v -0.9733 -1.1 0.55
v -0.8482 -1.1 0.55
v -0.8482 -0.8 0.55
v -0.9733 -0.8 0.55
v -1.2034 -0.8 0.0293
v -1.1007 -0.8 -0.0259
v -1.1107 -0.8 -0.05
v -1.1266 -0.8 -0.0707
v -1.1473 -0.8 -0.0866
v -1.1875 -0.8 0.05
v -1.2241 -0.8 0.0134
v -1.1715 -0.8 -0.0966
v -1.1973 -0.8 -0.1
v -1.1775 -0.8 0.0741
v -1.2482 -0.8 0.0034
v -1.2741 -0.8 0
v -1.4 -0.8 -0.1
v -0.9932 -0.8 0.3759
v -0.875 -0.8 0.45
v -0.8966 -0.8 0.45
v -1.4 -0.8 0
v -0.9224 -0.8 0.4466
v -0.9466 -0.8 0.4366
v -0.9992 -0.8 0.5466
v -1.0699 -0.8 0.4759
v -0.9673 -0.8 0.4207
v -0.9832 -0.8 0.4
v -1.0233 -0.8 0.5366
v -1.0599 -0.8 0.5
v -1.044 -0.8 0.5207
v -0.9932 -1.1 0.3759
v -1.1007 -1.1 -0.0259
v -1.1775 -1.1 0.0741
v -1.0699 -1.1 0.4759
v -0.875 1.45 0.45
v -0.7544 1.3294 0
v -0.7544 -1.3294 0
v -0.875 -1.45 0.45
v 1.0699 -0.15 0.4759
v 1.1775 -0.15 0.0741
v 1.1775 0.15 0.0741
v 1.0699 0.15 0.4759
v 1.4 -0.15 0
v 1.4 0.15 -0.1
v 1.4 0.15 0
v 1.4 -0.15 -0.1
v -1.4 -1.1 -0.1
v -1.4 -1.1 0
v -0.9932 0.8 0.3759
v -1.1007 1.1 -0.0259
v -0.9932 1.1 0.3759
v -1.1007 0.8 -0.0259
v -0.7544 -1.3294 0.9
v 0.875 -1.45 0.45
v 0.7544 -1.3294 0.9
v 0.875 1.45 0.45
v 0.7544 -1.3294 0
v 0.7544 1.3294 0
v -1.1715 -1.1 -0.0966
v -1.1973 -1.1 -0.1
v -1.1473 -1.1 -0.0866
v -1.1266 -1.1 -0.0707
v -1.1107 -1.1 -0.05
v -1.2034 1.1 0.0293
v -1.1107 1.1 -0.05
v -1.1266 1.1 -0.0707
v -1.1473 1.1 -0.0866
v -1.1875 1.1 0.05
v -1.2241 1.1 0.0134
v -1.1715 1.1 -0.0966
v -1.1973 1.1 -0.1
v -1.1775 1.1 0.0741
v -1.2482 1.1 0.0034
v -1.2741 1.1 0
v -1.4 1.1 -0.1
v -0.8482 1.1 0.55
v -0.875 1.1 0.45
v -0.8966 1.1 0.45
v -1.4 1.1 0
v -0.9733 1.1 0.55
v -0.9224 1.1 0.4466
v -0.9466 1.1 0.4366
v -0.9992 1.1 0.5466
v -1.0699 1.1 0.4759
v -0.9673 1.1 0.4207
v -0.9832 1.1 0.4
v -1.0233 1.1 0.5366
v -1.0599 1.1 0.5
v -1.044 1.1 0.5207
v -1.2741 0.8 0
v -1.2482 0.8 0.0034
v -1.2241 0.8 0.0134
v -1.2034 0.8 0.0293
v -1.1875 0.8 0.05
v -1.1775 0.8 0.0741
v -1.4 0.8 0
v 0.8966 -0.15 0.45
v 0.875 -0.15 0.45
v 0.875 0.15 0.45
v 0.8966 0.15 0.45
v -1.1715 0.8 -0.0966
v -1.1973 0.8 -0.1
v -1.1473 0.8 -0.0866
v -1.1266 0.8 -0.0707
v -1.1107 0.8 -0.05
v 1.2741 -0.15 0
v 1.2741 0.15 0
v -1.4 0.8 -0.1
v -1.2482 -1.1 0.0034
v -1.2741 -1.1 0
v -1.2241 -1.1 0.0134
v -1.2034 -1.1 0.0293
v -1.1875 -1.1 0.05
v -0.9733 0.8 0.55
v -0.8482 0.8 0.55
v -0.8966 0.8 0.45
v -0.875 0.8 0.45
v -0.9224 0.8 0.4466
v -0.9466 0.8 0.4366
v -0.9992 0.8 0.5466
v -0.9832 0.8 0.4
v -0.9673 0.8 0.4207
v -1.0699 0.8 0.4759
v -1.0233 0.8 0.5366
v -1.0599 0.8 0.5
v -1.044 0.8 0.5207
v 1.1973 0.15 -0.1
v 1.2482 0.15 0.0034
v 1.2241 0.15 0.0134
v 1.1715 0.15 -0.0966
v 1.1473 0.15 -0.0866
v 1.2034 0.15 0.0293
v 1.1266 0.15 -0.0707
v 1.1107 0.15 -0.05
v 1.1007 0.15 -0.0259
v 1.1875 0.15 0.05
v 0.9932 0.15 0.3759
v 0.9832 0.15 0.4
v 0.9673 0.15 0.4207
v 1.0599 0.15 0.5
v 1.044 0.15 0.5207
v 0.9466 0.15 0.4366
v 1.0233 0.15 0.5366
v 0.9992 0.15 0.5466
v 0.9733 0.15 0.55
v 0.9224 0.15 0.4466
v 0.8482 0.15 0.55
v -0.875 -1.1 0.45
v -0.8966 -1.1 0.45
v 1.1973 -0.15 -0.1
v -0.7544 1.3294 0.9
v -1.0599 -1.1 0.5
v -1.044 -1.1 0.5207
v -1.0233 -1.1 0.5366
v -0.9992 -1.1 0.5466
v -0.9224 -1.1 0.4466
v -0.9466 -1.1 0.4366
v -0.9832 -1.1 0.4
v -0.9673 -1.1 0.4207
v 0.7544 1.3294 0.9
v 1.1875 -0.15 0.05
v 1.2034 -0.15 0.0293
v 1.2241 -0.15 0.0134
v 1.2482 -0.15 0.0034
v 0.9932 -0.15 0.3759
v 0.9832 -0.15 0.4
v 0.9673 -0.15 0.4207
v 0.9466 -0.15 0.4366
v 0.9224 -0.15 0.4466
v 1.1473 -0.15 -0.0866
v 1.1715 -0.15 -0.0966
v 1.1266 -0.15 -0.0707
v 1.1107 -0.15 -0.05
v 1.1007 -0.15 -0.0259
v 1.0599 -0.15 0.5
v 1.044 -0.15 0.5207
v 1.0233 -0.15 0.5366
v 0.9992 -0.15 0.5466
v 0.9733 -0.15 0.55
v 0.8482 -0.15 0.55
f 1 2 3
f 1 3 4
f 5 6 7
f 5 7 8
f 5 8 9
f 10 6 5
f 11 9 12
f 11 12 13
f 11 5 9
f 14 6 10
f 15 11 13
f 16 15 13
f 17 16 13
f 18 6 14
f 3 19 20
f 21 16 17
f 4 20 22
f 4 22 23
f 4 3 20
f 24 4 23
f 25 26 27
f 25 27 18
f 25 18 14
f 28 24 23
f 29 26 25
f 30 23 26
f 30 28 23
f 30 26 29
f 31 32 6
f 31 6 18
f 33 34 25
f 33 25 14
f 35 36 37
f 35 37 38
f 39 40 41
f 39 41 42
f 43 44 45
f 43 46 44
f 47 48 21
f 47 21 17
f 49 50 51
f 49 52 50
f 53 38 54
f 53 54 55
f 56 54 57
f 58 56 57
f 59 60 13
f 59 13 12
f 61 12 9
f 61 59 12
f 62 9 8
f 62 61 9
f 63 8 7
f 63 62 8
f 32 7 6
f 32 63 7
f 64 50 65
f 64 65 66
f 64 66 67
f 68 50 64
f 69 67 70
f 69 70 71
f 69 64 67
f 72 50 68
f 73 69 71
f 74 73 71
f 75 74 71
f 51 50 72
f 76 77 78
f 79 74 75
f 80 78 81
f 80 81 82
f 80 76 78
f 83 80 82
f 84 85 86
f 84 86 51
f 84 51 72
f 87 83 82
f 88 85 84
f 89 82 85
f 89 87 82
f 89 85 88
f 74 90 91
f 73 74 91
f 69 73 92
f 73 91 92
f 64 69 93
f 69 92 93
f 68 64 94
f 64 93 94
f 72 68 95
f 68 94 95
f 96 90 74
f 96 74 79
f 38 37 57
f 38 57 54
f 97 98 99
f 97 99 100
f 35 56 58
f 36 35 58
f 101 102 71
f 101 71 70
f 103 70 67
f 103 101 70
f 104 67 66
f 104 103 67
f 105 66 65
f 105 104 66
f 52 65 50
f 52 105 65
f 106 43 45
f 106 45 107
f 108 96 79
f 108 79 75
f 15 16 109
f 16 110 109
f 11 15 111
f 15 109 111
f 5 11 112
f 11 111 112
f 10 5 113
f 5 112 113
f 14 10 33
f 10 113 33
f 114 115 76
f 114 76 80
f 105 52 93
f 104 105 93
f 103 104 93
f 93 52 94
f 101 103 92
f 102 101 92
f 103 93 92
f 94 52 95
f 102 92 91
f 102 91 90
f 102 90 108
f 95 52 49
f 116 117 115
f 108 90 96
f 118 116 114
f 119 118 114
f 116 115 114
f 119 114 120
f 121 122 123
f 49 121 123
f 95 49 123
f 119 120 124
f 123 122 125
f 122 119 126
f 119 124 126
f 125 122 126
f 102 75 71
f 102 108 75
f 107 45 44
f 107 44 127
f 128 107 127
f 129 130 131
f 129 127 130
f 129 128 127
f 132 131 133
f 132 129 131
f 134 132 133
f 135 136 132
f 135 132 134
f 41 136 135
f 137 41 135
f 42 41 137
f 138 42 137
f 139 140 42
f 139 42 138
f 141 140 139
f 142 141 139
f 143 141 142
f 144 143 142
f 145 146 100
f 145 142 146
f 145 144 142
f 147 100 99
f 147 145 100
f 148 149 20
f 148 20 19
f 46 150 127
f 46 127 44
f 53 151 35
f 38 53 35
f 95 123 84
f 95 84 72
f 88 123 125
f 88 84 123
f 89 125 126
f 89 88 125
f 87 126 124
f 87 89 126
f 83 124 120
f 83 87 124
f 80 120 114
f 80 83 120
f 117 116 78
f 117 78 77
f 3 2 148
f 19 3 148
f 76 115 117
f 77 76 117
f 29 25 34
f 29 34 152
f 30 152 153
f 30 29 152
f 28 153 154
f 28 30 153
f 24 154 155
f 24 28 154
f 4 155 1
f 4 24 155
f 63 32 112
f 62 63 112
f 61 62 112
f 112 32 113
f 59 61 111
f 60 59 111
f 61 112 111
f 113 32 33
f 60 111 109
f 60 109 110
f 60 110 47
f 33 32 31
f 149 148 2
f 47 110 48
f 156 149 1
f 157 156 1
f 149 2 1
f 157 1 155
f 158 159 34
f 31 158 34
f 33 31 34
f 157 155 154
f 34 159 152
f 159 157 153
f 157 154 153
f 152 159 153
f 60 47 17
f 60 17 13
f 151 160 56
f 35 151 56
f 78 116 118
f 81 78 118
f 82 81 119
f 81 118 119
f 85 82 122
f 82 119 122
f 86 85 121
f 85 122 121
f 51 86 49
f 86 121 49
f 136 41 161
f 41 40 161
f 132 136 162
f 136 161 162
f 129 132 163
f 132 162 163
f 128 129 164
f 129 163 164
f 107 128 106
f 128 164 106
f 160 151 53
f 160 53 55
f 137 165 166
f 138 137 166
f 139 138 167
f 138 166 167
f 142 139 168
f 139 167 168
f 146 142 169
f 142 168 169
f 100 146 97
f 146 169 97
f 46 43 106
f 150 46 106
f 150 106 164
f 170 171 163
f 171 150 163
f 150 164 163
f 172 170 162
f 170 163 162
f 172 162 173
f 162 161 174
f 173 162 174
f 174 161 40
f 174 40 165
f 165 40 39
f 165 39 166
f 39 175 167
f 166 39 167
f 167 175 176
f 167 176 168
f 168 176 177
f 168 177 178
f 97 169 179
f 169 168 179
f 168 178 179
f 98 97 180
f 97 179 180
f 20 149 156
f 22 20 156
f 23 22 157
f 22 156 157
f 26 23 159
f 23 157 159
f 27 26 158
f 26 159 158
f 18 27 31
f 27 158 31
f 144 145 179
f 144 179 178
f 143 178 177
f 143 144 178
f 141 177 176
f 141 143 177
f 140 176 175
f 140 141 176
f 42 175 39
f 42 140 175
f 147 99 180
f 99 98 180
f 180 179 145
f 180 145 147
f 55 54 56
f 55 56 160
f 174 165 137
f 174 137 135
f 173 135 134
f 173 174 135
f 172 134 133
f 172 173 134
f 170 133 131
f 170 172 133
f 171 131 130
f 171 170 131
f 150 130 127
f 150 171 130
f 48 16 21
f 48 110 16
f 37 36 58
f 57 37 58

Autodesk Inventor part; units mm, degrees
ref_plane "XZ Plane" through (0, 0, 0) normal (0, 1, 0) x (-1, 0, 0)
ref_plane "XY Plane" through (0, 0, 0) normal (0, 0, 1) x (1, 0, 0)
sketch "Sketch1" plane through (0, 0, 0) normal (0, 0, 1) x (1, 0, 0)
  line L0 (0.875, -1.45) -> (-0.875, -1.45)
  line L1 (-0.875, -1.45) -> (-0.875, 1.45)
  line L2 (-0.875, 1.45) -> (0.875, 1.45)
  line L3 (0.875, 1.45) -> (0.875, -1.45)
  line L4 (0.875, -1.45) -> (-0.875, 1.45) construction
  line L5 (-0.875, -1.45) -> (0.875, 1.45) construction
  point P0 (0, 0)
  dimension "d0" = 1.75
  dimension "d1" = 2.9
extrude "Extrusion1" add sketch "Sketch1" along normal blind 0.9
sketch "Sketch2" plane through (-0.875, 1.45, 0) normal (0, 1, 0) x (1, 0, 0)
  line L0 (0, 0) -> (1.75, 0) projected
  line L1 (0, 0) -> (0, -0.9) projected
  line L2 (1.75, -0.9) -> (0, -0.9) projected
  line L3 (1.75, 0) -> (1.75, -0.9) projected
  line L4 (1.75, -0.45) -> (1.6294, -0.9)
  line L5 (0, -0.9) -> (1.75, -0.9) projected
  line L6 (1.75, -0.45) -> (1.6294, 0)
  line L7 (1.75, 0) -> (0, 0) projected
  line L8 (0.1206, 0) -> (0, -0.45)
  line L9 (0.1206, -0.9) -> (0, -0.45)
  point P0 (0.875, 0)
  dimension "d4" = 15
  dimension "d5" = 15
extrude "Extrusion2" cut sketch "Sketch2" against normal through all contours L0 L6 L4 L2 L9 L8 keep common part
ref_plane "Work Plane1" through (1.25, 0, 0) normal (1, 0, 0) x (0, 1, 0)
sketch "Sketch4" plane through (1.25, 0, 0) normal (1, 0, 0) x (0, 1, 0)
  line L0 (1.45, 0.9) -> (-1.45, 0.9) projected
  line L1 (-1.45, 0) -> (1.45, 0) projected
  line L2 (-1.3294, 0) -> (-1.45, 0.45)
  line L3 (-1.45, 0.45) -> (-1.3294, 0.9)
  line L4 (1.3294, 0.9) -> (1.45, 0.45)
  line L5 (1.45, 0.45) -> (1.3294, 0)
  line L6 (1.45, 0) -> (1.45, 0.45) projected
  line L7 (-1.45, 0.45) -> (-1.45, 0) projected
  point P0 (0, 0)
  dimension "d10" = 15
  dimension "d11" = 15
  dimension "d12" = 0
extrude "Extrusion3" cut sketch "Sketch4" against normal through all contours L4 L5 L1 L2 L3 L0 keep common part
sketch "Sketch5" plane through (0, 0, 0) normal (0, 1, 0) x (-1, 0, 0)
  line L0 (-0.875, 0.45) -> (-0.7544, 0.9) projected
  line L1 (-0.7544, 0) -> (-0.875, 0.45) projected
  line L2 (-0.875, 0.45) -> (-0.9733, 0.45)
  line L3 (-0.9733, 0.45) -> (-1.1206, -0.1)
  line L4 (-1.1206, -0.1) -> (-1.4, -0.1)
  line L5 (-1.4, -0.1) -> (-1.4, 0)
  line L6 (-1.4, 0) -> (-1.1974, 0)
  line L7 (-1.1974, 0) -> (-1.05, 0.55)
  line L8 (-1.05, 0.55) -> (-0.8482, 0.55)
  line L9 (0.7544, 0) -> (-0.7544, 0) projected
  point P0 (0, 0)
  point P1 (0, 0)
  dimension "d15" = 0.1
  dimension "d17" = 0.1
  dimension "d18" = 0.1
  dimension "d19" = 0.1
  dimension "d20" = 105
  dimension "d21" = 1.4
  dimension "d22" = 0.35
extrude "Extrusion4" add sketch "Sketch5" along normal mid plane 0.3 separate body
fillet "Fillet1" radius 0.1 4 edges at (1.1974, 0, 0) (1.05, 0, 0.55) (1.1206, 0, -0.1) (0.9733, 0, 0.45)
pattern_linear "Rectangular Pattern1" count 3 spacing 0.95 along (0, 1, 0) of "Extrusion4", "Fillet1" first direction both ways yes bodies 2
mirror "Mirror1" about plane through (0, 0, 0) normal (1, 0, 0) of "Extrusion4", "Rectangular Pattern1" bodies 2
sketch "Sketch7" plane through (-1.4, 0.15, -0.1) normal (0, 1, 0) x (1, 0, 0)
  line L0 (0.5518, -0.65) -> (0.525, -0.55) projected
  line L1 (0.35, -0.65) -> (0.5518, -0.65) projected
  line L2 (0.2026, -0.1) -> (0.35, -0.65) projected
  line L3 (0, -0.1) -> (0.2026, -0.1) projected
  line L4 (0, 0) -> (0, -0.1) projected
  line L5 (0.2794, 0) -> (0, 0) projected
  line L6 (0.4267, -0.55) -> (0.2794, 0) projected
  line L7 (0.525, -0.55) -> (0.4267, -0.55) projected
  arc A0 (0.2992, -0.0741) -> (0.2026, 0) centre (0.2026, -0.1) ccw projected
  line L8 (0, 0) -> (0.2026, 0) projected
  line L9 (0, -0.1) -> (0, 0) projected
  line L10 (0.1259, -0.1) -> (0, -0.1) projected
  arc A1 (0.2225, -0.1741) -> (0.1259, -0.1) centre (0.1259, -0.2) ccw projected
  line L11 (0.3301, -0.5759) -> (0.2225, -0.1741) projected
  arc A2 (0.3301, -0.5759) -> (0.4267, -0.65) centre (0.4267, -0.55) ccw projected
  line L12 (0.5518, -0.65) -> (0.4267, -0.65) projected
  line L13 (0.525, -0.55) -> (0.5518, -0.65) projected
  line L14 (0.5035, -0.55) -> (0.525, -0.55) projected
  arc A3 (0.4069, -0.4759) -> (0.5035, -0.55) centre (0.5035, -0.45) ccw projected
  line L15 (0.2992, -0.0741) -> (0.4069, -0.4759) projected
  point P0 (1.4, -0.1)
extrude "Extrusion6" cut sketch "Sketch7" against normal up to surface (0.3 mm away) bodies 2
sketch "Sketch8" plane through (1.1974, -1.1, -0.1) normal (0, -1, 0) x (1, 0, 0)
  arc A0 (-0.0966, 0.0741) -> (0, 0) centre (0, 0.1) ccw projected
  line L0 (0, 0) -> (0.2026, 0) projected
  line L1 (0.2026, 0) -> (0.2026, 0.1) projected
  line L2 (0.2026, 0.1) -> (0.0767, 0.1) projected
  arc A1 (-0.0199, 0.1741) -> (0.0767, 0.1) centre (0.0767, 0.2) ccw projected
  line L3 (-0.0199, 0.1741) -> (-0.1275, 0.5759) projected
  arc A2 (-0.1275, 0.5759) -> (-0.2241, 0.65) centre (-0.2241, 0.55) ccw projected
  line L4 (-0.2241, 0.65) -> (-0.3492, 0.65) projected
  line L5 (-0.3492, 0.65) -> (-0.3224, 0.55) projected
  line L6 (-0.3224, 0.55) -> (-0.3008, 0.55) projected
  arc A3 (-0.2042, 0.4759) -> (-0.3008, 0.55) centre (-0.3008, 0.45) ccw projected
  line L7 (-0.2042, 0.4759) -> (-0.0966, 0.0741) projected
  point P0 (-1.1974, 0.1)
extrude "Extrusion7" cut sketch "Sketch8" against normal up to surface (0.3 mm away) bodies 2
sketch "Sketch9" plane through (1.1974, 1.1, -0.1) normal (0, 1, 0) x (1, 0, 0)
  arc A0 (0, 0) -> (-0.0966, -0.0741) centre (0, -0.1) ccw projected
  line L0 (-0.0966, -0.0741) -> (-0.2042, -0.4759) projected
  arc A1 (-0.3008, -0.55) -> (-0.2042, -0.4759) centre (-0.3008, -0.45) ccw projected
  line L1 (-0.3008, -0.55) -> (-0.3224, -0.55) projected
  line L2 (-0.3224, -0.55) -> (-0.3492, -0.65) projected
  line L3 (-0.3492, -0.65) -> (-0.2241, -0.65) projected
  arc A2 (-0.2241, -0.65) -> (-0.1275, -0.5759) centre (-0.2241, -0.55) ccw projected
  line L4 (-0.1275, -0.5759) -> (-0.0199, -0.1741) projected
  arc A3 (0.0767, -0.1) -> (-0.0199, -0.1741) centre (0.0767, -0.2) ccw projected
  line L5 (0.0767, -0.1) -> (0.2026, -0.1) projected
  line L6 (0.2026, -0.1) -> (0.2026, 0) projected
  line L7 (0.2026, 0) -> (0, 0) projected
  point P0 (-1.1974, -0.1)
extrude "Extrusion8" cut sketch "Sketch9" against normal up to surface (0.3 mm away) bodies 2
properties part number "SOT23-3" material "ABS Plastic"
